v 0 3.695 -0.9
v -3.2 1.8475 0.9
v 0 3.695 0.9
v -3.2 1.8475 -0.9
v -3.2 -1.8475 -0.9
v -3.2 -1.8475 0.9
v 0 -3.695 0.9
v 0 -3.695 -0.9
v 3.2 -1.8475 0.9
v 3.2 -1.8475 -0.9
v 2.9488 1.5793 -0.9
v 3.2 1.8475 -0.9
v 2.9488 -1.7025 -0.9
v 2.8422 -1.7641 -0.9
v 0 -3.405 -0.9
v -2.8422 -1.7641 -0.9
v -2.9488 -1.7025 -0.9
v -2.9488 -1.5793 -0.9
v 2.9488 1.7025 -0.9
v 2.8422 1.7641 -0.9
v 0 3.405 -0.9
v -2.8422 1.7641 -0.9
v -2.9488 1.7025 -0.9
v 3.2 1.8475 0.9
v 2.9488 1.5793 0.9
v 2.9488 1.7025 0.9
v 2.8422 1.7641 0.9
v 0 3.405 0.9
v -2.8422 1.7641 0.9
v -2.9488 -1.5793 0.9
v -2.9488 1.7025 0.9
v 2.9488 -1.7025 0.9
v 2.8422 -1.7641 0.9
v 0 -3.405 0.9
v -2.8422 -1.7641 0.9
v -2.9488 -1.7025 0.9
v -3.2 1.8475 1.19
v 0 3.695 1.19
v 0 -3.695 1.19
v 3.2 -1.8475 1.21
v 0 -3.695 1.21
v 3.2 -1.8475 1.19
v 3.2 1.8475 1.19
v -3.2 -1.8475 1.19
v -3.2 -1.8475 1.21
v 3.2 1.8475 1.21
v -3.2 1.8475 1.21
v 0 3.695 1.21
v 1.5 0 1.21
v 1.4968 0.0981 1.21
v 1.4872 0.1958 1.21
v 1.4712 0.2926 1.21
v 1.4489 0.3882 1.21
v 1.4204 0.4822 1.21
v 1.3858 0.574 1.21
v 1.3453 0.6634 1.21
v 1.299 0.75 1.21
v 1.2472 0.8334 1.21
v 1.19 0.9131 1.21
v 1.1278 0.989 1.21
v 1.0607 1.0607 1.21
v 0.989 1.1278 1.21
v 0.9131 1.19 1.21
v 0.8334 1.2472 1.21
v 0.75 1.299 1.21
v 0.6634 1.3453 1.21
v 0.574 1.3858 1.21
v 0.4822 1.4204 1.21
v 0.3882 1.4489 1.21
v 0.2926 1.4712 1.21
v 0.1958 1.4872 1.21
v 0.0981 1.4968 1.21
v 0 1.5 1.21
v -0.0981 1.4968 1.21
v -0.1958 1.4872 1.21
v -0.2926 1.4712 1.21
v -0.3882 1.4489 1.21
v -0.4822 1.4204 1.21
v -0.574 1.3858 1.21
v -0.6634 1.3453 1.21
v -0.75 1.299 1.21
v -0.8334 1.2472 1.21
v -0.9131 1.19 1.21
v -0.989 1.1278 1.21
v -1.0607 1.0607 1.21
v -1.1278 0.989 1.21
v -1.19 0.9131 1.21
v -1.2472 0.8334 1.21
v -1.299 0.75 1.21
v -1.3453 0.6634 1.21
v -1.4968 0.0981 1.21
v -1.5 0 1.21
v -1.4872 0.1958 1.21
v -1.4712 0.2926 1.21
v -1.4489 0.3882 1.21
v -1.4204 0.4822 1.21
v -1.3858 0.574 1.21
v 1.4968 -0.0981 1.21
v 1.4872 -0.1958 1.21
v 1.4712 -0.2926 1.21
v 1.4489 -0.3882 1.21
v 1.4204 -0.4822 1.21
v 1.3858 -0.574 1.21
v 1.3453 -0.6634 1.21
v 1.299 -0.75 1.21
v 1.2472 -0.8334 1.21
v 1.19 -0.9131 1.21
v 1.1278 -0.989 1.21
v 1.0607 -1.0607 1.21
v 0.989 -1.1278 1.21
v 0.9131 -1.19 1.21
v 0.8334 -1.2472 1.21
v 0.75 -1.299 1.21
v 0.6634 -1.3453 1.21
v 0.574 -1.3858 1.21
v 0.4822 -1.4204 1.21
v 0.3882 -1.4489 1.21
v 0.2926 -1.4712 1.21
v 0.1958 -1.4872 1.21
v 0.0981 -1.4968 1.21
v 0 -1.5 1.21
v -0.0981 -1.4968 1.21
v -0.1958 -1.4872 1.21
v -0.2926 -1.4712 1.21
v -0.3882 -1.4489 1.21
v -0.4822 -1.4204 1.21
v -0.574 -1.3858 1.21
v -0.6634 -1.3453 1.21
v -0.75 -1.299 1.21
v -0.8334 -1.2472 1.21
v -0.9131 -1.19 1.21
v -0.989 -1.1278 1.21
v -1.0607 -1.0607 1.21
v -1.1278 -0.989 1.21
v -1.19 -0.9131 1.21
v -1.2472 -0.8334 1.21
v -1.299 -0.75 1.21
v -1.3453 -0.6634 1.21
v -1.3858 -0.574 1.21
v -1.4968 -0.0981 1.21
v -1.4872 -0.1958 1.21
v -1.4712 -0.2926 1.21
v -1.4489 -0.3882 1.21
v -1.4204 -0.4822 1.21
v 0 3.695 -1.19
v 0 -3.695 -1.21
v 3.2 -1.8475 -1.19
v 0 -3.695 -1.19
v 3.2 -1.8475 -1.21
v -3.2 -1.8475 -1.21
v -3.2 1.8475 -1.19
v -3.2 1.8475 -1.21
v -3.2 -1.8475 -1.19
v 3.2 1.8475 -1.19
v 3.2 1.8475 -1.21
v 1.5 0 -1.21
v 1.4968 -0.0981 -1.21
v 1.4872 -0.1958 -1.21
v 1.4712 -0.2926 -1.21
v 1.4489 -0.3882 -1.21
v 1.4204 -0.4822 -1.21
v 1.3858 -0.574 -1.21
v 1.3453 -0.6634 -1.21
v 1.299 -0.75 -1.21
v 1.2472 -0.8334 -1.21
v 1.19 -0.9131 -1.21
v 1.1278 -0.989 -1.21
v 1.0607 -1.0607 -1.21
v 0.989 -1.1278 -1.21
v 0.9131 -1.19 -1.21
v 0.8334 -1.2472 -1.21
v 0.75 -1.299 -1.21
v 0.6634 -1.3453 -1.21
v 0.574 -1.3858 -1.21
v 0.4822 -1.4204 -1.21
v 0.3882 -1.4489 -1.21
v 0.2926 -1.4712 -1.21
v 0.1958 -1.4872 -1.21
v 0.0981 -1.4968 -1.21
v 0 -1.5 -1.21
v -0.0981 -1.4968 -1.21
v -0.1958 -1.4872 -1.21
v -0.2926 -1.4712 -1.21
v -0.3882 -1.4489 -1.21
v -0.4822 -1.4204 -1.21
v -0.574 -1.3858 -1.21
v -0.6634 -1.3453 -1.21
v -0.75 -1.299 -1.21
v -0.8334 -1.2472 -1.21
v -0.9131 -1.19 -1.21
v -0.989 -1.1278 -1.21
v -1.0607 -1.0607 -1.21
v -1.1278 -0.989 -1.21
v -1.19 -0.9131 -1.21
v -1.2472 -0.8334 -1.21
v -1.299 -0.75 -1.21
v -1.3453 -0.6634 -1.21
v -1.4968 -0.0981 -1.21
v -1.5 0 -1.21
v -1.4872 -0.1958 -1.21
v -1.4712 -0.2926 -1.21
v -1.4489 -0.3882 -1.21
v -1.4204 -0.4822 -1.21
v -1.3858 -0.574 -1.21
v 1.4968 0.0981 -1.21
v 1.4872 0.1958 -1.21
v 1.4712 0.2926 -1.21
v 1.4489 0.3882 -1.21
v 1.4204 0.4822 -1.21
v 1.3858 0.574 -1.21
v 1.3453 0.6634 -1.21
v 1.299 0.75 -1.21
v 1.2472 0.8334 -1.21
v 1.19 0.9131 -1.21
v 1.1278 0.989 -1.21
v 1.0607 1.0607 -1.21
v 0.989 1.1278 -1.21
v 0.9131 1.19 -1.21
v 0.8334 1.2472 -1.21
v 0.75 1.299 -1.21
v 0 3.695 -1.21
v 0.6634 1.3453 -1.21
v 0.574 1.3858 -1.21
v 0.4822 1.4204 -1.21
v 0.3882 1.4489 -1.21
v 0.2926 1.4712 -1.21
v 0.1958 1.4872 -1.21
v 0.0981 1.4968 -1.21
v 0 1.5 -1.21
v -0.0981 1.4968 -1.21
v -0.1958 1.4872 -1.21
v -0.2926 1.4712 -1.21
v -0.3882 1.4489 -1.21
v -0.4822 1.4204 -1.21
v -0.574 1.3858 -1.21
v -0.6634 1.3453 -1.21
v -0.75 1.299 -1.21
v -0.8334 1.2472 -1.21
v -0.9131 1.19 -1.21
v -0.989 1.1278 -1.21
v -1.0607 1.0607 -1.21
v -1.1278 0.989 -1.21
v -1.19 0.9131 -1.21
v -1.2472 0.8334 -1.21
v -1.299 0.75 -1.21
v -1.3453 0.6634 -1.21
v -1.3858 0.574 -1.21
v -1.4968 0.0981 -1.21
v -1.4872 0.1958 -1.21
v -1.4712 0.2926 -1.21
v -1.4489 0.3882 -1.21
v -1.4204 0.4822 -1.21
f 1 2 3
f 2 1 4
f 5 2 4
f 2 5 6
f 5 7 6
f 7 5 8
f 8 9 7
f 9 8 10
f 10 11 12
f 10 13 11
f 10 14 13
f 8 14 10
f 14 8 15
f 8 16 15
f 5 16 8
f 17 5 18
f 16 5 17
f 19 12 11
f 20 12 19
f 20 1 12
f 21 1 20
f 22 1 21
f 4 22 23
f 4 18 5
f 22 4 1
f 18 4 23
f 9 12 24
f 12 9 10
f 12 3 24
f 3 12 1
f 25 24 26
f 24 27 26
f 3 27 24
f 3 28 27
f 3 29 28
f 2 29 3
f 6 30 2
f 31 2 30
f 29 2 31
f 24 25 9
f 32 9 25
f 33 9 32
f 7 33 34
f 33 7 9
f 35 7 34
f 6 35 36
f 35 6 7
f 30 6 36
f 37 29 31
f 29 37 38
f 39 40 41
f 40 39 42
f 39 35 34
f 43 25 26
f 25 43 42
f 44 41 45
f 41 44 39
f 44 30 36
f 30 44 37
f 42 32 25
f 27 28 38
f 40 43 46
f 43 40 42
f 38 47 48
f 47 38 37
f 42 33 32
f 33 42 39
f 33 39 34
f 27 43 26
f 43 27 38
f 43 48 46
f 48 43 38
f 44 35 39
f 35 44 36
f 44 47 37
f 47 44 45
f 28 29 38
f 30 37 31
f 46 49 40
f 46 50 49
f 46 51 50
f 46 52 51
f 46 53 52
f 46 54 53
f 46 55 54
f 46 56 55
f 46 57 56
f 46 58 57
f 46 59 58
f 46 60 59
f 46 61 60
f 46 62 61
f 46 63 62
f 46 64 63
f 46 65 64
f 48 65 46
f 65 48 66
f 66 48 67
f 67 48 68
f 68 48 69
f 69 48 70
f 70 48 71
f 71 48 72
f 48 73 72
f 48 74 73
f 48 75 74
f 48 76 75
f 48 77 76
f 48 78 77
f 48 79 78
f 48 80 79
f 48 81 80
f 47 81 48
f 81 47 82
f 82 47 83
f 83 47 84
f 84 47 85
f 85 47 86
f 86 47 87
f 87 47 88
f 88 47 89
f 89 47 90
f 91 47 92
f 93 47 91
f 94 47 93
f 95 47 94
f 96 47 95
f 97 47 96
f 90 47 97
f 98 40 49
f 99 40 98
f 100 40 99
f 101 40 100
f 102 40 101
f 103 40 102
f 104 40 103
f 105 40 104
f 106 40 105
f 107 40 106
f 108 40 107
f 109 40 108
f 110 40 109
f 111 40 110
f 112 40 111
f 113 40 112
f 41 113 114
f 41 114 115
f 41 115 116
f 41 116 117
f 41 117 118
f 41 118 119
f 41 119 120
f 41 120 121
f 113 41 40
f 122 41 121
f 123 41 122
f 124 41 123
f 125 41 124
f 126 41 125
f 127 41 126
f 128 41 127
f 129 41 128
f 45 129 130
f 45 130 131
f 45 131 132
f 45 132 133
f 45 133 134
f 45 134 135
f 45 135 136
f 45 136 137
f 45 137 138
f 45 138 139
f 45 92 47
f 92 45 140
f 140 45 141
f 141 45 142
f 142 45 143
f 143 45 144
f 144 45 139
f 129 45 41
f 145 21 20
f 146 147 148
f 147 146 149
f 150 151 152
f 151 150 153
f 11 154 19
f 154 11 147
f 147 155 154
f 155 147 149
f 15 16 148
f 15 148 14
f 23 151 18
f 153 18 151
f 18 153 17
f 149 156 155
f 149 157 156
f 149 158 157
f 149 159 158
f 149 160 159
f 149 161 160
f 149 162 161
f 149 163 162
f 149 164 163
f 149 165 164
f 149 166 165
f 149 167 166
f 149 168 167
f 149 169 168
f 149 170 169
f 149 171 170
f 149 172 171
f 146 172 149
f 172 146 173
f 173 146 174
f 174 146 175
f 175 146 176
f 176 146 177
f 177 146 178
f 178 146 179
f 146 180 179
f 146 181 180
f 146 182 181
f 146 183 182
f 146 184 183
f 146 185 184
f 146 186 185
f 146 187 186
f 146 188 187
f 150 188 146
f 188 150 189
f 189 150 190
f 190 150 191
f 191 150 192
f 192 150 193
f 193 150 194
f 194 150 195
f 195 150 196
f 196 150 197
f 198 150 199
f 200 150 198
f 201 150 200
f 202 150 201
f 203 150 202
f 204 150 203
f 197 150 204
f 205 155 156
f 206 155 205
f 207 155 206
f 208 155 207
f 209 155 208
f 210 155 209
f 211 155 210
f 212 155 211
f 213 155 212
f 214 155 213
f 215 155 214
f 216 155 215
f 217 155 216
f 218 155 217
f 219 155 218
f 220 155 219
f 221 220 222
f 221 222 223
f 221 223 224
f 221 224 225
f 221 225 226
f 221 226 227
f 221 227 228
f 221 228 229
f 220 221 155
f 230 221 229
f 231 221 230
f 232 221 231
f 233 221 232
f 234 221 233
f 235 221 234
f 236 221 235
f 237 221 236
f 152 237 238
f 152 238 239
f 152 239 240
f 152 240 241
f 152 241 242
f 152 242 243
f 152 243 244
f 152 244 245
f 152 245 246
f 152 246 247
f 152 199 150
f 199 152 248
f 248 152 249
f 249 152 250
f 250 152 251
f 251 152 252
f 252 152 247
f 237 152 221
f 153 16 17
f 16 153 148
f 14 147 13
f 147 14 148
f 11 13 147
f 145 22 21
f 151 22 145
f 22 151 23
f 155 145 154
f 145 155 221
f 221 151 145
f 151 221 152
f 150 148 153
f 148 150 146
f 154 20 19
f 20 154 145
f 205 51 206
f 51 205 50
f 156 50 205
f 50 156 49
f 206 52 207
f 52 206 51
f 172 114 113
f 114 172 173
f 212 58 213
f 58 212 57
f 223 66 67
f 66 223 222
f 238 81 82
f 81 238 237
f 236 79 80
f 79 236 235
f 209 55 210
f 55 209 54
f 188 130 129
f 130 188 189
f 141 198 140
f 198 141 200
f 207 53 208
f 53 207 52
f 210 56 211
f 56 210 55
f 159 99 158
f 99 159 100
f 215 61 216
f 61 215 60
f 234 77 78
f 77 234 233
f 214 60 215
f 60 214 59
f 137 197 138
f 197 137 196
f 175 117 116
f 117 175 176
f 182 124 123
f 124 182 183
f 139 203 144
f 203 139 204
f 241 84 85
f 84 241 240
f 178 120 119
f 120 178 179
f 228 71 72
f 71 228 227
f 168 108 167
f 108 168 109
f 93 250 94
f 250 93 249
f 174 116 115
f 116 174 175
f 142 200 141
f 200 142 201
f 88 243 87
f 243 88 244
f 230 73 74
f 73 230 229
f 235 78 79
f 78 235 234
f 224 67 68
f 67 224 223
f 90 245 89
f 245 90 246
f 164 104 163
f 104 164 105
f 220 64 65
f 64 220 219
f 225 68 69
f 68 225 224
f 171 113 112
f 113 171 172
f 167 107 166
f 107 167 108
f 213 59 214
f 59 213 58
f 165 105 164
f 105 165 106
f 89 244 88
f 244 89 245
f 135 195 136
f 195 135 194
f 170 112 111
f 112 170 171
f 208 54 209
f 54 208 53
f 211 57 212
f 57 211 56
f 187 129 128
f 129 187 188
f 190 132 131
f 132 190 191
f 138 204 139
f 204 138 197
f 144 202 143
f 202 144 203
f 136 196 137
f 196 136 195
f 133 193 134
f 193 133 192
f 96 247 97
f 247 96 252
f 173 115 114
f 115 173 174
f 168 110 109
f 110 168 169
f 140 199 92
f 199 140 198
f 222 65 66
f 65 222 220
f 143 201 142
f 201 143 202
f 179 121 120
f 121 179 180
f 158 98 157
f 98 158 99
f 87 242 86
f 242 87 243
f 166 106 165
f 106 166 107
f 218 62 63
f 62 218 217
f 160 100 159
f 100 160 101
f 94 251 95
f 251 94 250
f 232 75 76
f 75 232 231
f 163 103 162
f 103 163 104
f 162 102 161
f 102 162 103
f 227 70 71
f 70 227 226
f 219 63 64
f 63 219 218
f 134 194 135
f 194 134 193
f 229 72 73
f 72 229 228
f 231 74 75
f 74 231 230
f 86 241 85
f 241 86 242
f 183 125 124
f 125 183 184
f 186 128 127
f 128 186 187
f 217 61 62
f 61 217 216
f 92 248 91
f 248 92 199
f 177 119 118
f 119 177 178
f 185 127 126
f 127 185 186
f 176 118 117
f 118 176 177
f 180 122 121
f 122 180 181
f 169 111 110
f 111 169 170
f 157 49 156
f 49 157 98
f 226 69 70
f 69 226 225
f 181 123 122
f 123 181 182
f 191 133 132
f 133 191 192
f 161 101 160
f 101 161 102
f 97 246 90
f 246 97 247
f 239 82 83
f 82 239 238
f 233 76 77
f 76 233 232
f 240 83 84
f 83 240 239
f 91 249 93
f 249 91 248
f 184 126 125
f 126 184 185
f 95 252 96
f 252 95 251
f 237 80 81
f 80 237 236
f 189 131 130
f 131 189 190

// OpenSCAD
$fn = 96;

// Target dimensions (mm)
across_flats   = 6.4;   // hex width across flats
thickness      = 2.4;   // nut thickness
hole_diameter  = 3.0;   // through-hole for M3 screw (no clearance added)
chamfer_size   = 0.3;   // edge chamfer height
eps            = 0.02;  // tiny overlap to avoid coincident faces

// Derived: circumradius of hex from across-flats
// across_flats = 2 * R * cos(30) = R * sqrt(3)  => R = across_flats / sqrt(3)
hex_R = across_flats / sqrt(3);

module hex2d(R){
    // Flat-to-flat is along Y for this point set; rotate 30° so flats align with X/Y axes
    rotate(30)
        polygon(points=[
            [ R, 0],
            [ R/2,  R*sqrt(3)/2],
            [-R/2,  R*sqrt(3)/2],
            [-R, 0],
            [-R/2, -R*sqrt(3)/2],
            [ R/2, -R*sqrt(3)/2]
        ]);
}

module hex_prism(h, R){
    linear_extrude(height=h, center=true, convexity=10)
        hex2d(R);
}

module hex_nut(){
    difference(){
        // Outer body: true hex across flats, with hex chamfers (not circular)
        union(){
            // Middle straight section
            hex_prism(thickness - 2*chamfer_size, hex_R);

            // Top chamfer: hull between smaller and full hex
            translate([0,0, thickness/2 - chamfer_size/2])
                hull(){
                    translate([0,0, -chamfer_size/2])
                        linear_extrude(height=eps, center=true) hex2d(hex_R - chamfer_size);
                    translate([0,0,  chamfer_size/2])
                        linear_extrude(height=eps, center=true) hex2d(hex_R);
                }

            // Bottom chamfer: hull between full and smaller hex
            translate([0,0, -(thickness/2 - chamfer_size/2)])
                hull(){
                    translate([0,0, -chamfer_size/2])
                        linear_extrude(height=eps, center=true) hex2d(hex_R);
                    translate([0,0,  chamfer_size/2])
                        linear_extrude(height=eps, center=true) hex2d(hex_R - chamfer_size);
                }
        }

        // Through-hole (true through, with overlap)
        cylinder(h=thickness + 2*eps, d=hole_diameter, center=true);
    }
}

hex_nut();
